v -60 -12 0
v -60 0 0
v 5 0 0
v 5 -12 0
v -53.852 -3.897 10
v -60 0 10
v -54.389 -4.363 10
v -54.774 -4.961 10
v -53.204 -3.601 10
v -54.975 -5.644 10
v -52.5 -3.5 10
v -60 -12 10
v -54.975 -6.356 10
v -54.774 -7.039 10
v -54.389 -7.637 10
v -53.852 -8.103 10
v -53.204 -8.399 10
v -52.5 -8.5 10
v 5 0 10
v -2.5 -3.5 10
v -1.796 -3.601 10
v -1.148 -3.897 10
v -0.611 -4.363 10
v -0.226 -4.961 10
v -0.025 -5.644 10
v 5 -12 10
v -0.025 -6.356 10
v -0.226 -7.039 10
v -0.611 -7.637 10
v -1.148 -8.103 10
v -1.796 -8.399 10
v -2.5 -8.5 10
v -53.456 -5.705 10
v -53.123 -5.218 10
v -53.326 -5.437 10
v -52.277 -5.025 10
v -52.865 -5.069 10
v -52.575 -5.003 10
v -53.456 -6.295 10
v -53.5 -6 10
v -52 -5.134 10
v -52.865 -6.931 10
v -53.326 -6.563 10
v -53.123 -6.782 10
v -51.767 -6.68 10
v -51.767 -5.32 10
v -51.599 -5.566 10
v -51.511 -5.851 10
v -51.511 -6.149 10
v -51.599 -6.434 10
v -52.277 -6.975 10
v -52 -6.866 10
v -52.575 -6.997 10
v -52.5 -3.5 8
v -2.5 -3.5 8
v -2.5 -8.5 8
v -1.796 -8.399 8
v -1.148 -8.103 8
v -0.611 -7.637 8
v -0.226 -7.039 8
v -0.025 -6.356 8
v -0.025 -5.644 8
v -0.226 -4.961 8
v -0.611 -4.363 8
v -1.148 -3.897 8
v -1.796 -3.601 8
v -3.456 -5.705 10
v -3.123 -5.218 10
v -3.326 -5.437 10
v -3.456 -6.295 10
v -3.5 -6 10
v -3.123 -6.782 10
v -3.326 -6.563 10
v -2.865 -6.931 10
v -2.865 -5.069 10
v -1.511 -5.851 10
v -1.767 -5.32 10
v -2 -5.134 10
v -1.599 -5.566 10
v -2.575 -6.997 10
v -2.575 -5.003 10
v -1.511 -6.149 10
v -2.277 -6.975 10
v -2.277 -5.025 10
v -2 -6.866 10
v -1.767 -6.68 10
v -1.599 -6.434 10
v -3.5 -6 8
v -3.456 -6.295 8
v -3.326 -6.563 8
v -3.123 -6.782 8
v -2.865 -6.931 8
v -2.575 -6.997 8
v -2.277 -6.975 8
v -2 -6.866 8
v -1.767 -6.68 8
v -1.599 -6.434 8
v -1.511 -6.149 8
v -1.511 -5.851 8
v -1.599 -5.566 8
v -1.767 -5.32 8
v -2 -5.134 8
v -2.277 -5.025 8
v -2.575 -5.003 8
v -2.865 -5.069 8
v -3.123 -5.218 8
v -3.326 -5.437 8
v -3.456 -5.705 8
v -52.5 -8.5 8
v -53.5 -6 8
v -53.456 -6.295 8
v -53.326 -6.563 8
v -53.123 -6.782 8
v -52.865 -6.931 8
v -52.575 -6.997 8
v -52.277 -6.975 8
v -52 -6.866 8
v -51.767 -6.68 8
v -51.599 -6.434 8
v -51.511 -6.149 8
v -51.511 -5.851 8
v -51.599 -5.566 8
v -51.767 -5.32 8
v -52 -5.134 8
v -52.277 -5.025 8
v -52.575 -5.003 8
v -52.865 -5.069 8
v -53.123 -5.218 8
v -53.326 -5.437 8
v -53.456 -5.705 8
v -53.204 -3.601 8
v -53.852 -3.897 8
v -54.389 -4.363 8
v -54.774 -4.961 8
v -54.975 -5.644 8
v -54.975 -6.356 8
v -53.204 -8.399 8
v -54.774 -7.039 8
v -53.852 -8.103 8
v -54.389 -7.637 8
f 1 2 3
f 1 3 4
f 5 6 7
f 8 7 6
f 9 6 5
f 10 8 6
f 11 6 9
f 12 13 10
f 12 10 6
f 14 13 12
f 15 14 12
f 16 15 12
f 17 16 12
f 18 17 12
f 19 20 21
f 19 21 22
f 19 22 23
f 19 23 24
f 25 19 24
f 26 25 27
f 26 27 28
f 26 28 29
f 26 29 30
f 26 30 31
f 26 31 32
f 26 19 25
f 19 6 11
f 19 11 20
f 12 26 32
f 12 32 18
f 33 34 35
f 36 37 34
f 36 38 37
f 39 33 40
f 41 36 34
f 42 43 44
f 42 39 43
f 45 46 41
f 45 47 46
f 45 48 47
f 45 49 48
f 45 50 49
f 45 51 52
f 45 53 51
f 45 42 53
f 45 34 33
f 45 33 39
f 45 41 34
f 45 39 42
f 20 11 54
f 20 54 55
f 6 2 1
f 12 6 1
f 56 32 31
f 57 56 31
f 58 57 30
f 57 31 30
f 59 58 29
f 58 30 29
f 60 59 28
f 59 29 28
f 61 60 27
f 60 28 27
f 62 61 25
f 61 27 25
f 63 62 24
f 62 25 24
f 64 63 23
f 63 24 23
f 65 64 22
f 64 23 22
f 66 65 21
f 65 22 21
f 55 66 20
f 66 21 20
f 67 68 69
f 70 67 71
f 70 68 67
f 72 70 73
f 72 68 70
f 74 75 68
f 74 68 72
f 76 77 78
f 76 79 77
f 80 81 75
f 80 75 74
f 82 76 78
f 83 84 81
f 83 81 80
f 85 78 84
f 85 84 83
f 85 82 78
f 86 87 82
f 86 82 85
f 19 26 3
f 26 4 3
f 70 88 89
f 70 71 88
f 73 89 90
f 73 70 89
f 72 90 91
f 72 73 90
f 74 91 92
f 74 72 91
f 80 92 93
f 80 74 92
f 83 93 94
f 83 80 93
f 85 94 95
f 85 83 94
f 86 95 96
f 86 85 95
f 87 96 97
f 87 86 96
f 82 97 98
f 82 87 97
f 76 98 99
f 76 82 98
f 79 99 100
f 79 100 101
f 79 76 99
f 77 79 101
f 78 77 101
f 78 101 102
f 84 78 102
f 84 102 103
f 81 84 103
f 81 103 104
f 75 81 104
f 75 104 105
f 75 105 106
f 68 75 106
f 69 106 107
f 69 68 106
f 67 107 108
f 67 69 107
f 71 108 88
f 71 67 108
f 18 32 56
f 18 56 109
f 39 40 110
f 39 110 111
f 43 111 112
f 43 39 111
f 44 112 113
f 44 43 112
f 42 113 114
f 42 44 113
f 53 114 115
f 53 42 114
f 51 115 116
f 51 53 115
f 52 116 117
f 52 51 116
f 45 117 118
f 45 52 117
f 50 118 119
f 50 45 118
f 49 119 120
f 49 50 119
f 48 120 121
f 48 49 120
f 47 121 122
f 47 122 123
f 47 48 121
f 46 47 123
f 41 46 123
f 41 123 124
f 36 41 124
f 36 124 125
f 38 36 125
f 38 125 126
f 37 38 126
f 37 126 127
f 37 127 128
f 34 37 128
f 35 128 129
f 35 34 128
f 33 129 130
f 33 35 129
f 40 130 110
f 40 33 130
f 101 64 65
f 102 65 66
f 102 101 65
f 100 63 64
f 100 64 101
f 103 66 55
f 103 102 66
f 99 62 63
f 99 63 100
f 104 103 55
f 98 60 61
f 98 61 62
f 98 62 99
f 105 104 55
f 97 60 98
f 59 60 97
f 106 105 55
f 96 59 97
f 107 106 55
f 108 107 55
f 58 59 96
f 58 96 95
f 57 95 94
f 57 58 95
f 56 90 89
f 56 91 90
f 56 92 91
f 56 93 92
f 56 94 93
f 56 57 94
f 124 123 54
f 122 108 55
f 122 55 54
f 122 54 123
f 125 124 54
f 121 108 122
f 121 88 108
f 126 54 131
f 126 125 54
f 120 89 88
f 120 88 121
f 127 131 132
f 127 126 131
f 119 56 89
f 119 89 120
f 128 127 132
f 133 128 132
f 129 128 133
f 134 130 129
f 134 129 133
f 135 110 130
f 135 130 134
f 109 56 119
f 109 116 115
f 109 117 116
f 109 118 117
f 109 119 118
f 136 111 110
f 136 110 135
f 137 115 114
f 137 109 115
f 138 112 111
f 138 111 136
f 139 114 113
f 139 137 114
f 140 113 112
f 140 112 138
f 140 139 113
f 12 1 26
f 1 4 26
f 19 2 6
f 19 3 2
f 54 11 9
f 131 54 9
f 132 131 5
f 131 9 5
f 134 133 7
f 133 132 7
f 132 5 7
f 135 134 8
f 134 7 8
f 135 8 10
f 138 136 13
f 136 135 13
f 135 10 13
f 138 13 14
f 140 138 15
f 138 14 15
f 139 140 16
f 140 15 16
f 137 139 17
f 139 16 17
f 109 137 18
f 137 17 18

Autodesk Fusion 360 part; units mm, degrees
sketch "Sketch1" plane through (0, 0, 0) normal (0, 0, 1) x (1, 0, 0)
  line L0 (0, 0) -> (-55, 0)
  line L1 (-55, 0) -> (-55, -12)
  line L2 (-55, -12) -> (0, -12)
  line L3 (0, -12) -> (0, 0)
  dimension "d1" = 12
  dimension "d2" = 55
extrude "Extrude1" add sketch "Sketch1" along normal blind 10
sketch "Sketch2" plane through (0, 0, 10) normal (0, 0, 1) x (-1, 0, 0)
  line L0 (0, 12) -> (0, 0)
  line L1 (0, 0) -> (55, 0)
  line L2 (55, 0) -> (55, 12)
  line L3 (55, 12) -> (0, 12)
  line L4 (0, 6) -> (55, 6)
  line L5 (27.5, 12) -> (27.5, 0)
  line L6 (27.5, 6) -> (2.5, 6)
  line L7 (27.5, 6) -> (52.5, 6)
  circle A0 centre (2.5, 6) radius 1
  circle A1 centre (2.5, 6) radius 2.5
  circle A2 centre (52.5, 6) radius 1
  circle A3 centre (52.5, 6) radius 2.5
  line L8 (2.5, 6) -> (2.5, 3.5)
  line L9 (52.5, 3.5) -> (2.5, 3.5)
  line L10 (2.5, 8.5) -> (52.5, 8.5)
  dimension "d5" = 25
  dimension "d6" = 25
  dimension "d7" = 2
  dimension "d8" = 5
  dimension "d9" = 2
  dimension "d10" = 5
extrude "Extrude2" add 1 faces at (0, -8, 3.3333) along direction (1, 0, 0) blind 5
extrude "Extrude3" add 1 faces at (-55, -4, 3.3333) along direction (-1, 0, 0) blind 5
extrude "Extrude4" cut sketch "Sketch2" against normal blind 2 contours L4 L6 A0 A1 | L4 A0 A1 L8 | L4 L5 L6 A1 L10 | L4 L6 A0 A1 L8 | L4 L5 L6 A1 L9 | L4 L5 L7 A3 L10 | L4 L5 L7 A3 L9 | L4 L7 A2 A3 | L4 L7 A2 A3
